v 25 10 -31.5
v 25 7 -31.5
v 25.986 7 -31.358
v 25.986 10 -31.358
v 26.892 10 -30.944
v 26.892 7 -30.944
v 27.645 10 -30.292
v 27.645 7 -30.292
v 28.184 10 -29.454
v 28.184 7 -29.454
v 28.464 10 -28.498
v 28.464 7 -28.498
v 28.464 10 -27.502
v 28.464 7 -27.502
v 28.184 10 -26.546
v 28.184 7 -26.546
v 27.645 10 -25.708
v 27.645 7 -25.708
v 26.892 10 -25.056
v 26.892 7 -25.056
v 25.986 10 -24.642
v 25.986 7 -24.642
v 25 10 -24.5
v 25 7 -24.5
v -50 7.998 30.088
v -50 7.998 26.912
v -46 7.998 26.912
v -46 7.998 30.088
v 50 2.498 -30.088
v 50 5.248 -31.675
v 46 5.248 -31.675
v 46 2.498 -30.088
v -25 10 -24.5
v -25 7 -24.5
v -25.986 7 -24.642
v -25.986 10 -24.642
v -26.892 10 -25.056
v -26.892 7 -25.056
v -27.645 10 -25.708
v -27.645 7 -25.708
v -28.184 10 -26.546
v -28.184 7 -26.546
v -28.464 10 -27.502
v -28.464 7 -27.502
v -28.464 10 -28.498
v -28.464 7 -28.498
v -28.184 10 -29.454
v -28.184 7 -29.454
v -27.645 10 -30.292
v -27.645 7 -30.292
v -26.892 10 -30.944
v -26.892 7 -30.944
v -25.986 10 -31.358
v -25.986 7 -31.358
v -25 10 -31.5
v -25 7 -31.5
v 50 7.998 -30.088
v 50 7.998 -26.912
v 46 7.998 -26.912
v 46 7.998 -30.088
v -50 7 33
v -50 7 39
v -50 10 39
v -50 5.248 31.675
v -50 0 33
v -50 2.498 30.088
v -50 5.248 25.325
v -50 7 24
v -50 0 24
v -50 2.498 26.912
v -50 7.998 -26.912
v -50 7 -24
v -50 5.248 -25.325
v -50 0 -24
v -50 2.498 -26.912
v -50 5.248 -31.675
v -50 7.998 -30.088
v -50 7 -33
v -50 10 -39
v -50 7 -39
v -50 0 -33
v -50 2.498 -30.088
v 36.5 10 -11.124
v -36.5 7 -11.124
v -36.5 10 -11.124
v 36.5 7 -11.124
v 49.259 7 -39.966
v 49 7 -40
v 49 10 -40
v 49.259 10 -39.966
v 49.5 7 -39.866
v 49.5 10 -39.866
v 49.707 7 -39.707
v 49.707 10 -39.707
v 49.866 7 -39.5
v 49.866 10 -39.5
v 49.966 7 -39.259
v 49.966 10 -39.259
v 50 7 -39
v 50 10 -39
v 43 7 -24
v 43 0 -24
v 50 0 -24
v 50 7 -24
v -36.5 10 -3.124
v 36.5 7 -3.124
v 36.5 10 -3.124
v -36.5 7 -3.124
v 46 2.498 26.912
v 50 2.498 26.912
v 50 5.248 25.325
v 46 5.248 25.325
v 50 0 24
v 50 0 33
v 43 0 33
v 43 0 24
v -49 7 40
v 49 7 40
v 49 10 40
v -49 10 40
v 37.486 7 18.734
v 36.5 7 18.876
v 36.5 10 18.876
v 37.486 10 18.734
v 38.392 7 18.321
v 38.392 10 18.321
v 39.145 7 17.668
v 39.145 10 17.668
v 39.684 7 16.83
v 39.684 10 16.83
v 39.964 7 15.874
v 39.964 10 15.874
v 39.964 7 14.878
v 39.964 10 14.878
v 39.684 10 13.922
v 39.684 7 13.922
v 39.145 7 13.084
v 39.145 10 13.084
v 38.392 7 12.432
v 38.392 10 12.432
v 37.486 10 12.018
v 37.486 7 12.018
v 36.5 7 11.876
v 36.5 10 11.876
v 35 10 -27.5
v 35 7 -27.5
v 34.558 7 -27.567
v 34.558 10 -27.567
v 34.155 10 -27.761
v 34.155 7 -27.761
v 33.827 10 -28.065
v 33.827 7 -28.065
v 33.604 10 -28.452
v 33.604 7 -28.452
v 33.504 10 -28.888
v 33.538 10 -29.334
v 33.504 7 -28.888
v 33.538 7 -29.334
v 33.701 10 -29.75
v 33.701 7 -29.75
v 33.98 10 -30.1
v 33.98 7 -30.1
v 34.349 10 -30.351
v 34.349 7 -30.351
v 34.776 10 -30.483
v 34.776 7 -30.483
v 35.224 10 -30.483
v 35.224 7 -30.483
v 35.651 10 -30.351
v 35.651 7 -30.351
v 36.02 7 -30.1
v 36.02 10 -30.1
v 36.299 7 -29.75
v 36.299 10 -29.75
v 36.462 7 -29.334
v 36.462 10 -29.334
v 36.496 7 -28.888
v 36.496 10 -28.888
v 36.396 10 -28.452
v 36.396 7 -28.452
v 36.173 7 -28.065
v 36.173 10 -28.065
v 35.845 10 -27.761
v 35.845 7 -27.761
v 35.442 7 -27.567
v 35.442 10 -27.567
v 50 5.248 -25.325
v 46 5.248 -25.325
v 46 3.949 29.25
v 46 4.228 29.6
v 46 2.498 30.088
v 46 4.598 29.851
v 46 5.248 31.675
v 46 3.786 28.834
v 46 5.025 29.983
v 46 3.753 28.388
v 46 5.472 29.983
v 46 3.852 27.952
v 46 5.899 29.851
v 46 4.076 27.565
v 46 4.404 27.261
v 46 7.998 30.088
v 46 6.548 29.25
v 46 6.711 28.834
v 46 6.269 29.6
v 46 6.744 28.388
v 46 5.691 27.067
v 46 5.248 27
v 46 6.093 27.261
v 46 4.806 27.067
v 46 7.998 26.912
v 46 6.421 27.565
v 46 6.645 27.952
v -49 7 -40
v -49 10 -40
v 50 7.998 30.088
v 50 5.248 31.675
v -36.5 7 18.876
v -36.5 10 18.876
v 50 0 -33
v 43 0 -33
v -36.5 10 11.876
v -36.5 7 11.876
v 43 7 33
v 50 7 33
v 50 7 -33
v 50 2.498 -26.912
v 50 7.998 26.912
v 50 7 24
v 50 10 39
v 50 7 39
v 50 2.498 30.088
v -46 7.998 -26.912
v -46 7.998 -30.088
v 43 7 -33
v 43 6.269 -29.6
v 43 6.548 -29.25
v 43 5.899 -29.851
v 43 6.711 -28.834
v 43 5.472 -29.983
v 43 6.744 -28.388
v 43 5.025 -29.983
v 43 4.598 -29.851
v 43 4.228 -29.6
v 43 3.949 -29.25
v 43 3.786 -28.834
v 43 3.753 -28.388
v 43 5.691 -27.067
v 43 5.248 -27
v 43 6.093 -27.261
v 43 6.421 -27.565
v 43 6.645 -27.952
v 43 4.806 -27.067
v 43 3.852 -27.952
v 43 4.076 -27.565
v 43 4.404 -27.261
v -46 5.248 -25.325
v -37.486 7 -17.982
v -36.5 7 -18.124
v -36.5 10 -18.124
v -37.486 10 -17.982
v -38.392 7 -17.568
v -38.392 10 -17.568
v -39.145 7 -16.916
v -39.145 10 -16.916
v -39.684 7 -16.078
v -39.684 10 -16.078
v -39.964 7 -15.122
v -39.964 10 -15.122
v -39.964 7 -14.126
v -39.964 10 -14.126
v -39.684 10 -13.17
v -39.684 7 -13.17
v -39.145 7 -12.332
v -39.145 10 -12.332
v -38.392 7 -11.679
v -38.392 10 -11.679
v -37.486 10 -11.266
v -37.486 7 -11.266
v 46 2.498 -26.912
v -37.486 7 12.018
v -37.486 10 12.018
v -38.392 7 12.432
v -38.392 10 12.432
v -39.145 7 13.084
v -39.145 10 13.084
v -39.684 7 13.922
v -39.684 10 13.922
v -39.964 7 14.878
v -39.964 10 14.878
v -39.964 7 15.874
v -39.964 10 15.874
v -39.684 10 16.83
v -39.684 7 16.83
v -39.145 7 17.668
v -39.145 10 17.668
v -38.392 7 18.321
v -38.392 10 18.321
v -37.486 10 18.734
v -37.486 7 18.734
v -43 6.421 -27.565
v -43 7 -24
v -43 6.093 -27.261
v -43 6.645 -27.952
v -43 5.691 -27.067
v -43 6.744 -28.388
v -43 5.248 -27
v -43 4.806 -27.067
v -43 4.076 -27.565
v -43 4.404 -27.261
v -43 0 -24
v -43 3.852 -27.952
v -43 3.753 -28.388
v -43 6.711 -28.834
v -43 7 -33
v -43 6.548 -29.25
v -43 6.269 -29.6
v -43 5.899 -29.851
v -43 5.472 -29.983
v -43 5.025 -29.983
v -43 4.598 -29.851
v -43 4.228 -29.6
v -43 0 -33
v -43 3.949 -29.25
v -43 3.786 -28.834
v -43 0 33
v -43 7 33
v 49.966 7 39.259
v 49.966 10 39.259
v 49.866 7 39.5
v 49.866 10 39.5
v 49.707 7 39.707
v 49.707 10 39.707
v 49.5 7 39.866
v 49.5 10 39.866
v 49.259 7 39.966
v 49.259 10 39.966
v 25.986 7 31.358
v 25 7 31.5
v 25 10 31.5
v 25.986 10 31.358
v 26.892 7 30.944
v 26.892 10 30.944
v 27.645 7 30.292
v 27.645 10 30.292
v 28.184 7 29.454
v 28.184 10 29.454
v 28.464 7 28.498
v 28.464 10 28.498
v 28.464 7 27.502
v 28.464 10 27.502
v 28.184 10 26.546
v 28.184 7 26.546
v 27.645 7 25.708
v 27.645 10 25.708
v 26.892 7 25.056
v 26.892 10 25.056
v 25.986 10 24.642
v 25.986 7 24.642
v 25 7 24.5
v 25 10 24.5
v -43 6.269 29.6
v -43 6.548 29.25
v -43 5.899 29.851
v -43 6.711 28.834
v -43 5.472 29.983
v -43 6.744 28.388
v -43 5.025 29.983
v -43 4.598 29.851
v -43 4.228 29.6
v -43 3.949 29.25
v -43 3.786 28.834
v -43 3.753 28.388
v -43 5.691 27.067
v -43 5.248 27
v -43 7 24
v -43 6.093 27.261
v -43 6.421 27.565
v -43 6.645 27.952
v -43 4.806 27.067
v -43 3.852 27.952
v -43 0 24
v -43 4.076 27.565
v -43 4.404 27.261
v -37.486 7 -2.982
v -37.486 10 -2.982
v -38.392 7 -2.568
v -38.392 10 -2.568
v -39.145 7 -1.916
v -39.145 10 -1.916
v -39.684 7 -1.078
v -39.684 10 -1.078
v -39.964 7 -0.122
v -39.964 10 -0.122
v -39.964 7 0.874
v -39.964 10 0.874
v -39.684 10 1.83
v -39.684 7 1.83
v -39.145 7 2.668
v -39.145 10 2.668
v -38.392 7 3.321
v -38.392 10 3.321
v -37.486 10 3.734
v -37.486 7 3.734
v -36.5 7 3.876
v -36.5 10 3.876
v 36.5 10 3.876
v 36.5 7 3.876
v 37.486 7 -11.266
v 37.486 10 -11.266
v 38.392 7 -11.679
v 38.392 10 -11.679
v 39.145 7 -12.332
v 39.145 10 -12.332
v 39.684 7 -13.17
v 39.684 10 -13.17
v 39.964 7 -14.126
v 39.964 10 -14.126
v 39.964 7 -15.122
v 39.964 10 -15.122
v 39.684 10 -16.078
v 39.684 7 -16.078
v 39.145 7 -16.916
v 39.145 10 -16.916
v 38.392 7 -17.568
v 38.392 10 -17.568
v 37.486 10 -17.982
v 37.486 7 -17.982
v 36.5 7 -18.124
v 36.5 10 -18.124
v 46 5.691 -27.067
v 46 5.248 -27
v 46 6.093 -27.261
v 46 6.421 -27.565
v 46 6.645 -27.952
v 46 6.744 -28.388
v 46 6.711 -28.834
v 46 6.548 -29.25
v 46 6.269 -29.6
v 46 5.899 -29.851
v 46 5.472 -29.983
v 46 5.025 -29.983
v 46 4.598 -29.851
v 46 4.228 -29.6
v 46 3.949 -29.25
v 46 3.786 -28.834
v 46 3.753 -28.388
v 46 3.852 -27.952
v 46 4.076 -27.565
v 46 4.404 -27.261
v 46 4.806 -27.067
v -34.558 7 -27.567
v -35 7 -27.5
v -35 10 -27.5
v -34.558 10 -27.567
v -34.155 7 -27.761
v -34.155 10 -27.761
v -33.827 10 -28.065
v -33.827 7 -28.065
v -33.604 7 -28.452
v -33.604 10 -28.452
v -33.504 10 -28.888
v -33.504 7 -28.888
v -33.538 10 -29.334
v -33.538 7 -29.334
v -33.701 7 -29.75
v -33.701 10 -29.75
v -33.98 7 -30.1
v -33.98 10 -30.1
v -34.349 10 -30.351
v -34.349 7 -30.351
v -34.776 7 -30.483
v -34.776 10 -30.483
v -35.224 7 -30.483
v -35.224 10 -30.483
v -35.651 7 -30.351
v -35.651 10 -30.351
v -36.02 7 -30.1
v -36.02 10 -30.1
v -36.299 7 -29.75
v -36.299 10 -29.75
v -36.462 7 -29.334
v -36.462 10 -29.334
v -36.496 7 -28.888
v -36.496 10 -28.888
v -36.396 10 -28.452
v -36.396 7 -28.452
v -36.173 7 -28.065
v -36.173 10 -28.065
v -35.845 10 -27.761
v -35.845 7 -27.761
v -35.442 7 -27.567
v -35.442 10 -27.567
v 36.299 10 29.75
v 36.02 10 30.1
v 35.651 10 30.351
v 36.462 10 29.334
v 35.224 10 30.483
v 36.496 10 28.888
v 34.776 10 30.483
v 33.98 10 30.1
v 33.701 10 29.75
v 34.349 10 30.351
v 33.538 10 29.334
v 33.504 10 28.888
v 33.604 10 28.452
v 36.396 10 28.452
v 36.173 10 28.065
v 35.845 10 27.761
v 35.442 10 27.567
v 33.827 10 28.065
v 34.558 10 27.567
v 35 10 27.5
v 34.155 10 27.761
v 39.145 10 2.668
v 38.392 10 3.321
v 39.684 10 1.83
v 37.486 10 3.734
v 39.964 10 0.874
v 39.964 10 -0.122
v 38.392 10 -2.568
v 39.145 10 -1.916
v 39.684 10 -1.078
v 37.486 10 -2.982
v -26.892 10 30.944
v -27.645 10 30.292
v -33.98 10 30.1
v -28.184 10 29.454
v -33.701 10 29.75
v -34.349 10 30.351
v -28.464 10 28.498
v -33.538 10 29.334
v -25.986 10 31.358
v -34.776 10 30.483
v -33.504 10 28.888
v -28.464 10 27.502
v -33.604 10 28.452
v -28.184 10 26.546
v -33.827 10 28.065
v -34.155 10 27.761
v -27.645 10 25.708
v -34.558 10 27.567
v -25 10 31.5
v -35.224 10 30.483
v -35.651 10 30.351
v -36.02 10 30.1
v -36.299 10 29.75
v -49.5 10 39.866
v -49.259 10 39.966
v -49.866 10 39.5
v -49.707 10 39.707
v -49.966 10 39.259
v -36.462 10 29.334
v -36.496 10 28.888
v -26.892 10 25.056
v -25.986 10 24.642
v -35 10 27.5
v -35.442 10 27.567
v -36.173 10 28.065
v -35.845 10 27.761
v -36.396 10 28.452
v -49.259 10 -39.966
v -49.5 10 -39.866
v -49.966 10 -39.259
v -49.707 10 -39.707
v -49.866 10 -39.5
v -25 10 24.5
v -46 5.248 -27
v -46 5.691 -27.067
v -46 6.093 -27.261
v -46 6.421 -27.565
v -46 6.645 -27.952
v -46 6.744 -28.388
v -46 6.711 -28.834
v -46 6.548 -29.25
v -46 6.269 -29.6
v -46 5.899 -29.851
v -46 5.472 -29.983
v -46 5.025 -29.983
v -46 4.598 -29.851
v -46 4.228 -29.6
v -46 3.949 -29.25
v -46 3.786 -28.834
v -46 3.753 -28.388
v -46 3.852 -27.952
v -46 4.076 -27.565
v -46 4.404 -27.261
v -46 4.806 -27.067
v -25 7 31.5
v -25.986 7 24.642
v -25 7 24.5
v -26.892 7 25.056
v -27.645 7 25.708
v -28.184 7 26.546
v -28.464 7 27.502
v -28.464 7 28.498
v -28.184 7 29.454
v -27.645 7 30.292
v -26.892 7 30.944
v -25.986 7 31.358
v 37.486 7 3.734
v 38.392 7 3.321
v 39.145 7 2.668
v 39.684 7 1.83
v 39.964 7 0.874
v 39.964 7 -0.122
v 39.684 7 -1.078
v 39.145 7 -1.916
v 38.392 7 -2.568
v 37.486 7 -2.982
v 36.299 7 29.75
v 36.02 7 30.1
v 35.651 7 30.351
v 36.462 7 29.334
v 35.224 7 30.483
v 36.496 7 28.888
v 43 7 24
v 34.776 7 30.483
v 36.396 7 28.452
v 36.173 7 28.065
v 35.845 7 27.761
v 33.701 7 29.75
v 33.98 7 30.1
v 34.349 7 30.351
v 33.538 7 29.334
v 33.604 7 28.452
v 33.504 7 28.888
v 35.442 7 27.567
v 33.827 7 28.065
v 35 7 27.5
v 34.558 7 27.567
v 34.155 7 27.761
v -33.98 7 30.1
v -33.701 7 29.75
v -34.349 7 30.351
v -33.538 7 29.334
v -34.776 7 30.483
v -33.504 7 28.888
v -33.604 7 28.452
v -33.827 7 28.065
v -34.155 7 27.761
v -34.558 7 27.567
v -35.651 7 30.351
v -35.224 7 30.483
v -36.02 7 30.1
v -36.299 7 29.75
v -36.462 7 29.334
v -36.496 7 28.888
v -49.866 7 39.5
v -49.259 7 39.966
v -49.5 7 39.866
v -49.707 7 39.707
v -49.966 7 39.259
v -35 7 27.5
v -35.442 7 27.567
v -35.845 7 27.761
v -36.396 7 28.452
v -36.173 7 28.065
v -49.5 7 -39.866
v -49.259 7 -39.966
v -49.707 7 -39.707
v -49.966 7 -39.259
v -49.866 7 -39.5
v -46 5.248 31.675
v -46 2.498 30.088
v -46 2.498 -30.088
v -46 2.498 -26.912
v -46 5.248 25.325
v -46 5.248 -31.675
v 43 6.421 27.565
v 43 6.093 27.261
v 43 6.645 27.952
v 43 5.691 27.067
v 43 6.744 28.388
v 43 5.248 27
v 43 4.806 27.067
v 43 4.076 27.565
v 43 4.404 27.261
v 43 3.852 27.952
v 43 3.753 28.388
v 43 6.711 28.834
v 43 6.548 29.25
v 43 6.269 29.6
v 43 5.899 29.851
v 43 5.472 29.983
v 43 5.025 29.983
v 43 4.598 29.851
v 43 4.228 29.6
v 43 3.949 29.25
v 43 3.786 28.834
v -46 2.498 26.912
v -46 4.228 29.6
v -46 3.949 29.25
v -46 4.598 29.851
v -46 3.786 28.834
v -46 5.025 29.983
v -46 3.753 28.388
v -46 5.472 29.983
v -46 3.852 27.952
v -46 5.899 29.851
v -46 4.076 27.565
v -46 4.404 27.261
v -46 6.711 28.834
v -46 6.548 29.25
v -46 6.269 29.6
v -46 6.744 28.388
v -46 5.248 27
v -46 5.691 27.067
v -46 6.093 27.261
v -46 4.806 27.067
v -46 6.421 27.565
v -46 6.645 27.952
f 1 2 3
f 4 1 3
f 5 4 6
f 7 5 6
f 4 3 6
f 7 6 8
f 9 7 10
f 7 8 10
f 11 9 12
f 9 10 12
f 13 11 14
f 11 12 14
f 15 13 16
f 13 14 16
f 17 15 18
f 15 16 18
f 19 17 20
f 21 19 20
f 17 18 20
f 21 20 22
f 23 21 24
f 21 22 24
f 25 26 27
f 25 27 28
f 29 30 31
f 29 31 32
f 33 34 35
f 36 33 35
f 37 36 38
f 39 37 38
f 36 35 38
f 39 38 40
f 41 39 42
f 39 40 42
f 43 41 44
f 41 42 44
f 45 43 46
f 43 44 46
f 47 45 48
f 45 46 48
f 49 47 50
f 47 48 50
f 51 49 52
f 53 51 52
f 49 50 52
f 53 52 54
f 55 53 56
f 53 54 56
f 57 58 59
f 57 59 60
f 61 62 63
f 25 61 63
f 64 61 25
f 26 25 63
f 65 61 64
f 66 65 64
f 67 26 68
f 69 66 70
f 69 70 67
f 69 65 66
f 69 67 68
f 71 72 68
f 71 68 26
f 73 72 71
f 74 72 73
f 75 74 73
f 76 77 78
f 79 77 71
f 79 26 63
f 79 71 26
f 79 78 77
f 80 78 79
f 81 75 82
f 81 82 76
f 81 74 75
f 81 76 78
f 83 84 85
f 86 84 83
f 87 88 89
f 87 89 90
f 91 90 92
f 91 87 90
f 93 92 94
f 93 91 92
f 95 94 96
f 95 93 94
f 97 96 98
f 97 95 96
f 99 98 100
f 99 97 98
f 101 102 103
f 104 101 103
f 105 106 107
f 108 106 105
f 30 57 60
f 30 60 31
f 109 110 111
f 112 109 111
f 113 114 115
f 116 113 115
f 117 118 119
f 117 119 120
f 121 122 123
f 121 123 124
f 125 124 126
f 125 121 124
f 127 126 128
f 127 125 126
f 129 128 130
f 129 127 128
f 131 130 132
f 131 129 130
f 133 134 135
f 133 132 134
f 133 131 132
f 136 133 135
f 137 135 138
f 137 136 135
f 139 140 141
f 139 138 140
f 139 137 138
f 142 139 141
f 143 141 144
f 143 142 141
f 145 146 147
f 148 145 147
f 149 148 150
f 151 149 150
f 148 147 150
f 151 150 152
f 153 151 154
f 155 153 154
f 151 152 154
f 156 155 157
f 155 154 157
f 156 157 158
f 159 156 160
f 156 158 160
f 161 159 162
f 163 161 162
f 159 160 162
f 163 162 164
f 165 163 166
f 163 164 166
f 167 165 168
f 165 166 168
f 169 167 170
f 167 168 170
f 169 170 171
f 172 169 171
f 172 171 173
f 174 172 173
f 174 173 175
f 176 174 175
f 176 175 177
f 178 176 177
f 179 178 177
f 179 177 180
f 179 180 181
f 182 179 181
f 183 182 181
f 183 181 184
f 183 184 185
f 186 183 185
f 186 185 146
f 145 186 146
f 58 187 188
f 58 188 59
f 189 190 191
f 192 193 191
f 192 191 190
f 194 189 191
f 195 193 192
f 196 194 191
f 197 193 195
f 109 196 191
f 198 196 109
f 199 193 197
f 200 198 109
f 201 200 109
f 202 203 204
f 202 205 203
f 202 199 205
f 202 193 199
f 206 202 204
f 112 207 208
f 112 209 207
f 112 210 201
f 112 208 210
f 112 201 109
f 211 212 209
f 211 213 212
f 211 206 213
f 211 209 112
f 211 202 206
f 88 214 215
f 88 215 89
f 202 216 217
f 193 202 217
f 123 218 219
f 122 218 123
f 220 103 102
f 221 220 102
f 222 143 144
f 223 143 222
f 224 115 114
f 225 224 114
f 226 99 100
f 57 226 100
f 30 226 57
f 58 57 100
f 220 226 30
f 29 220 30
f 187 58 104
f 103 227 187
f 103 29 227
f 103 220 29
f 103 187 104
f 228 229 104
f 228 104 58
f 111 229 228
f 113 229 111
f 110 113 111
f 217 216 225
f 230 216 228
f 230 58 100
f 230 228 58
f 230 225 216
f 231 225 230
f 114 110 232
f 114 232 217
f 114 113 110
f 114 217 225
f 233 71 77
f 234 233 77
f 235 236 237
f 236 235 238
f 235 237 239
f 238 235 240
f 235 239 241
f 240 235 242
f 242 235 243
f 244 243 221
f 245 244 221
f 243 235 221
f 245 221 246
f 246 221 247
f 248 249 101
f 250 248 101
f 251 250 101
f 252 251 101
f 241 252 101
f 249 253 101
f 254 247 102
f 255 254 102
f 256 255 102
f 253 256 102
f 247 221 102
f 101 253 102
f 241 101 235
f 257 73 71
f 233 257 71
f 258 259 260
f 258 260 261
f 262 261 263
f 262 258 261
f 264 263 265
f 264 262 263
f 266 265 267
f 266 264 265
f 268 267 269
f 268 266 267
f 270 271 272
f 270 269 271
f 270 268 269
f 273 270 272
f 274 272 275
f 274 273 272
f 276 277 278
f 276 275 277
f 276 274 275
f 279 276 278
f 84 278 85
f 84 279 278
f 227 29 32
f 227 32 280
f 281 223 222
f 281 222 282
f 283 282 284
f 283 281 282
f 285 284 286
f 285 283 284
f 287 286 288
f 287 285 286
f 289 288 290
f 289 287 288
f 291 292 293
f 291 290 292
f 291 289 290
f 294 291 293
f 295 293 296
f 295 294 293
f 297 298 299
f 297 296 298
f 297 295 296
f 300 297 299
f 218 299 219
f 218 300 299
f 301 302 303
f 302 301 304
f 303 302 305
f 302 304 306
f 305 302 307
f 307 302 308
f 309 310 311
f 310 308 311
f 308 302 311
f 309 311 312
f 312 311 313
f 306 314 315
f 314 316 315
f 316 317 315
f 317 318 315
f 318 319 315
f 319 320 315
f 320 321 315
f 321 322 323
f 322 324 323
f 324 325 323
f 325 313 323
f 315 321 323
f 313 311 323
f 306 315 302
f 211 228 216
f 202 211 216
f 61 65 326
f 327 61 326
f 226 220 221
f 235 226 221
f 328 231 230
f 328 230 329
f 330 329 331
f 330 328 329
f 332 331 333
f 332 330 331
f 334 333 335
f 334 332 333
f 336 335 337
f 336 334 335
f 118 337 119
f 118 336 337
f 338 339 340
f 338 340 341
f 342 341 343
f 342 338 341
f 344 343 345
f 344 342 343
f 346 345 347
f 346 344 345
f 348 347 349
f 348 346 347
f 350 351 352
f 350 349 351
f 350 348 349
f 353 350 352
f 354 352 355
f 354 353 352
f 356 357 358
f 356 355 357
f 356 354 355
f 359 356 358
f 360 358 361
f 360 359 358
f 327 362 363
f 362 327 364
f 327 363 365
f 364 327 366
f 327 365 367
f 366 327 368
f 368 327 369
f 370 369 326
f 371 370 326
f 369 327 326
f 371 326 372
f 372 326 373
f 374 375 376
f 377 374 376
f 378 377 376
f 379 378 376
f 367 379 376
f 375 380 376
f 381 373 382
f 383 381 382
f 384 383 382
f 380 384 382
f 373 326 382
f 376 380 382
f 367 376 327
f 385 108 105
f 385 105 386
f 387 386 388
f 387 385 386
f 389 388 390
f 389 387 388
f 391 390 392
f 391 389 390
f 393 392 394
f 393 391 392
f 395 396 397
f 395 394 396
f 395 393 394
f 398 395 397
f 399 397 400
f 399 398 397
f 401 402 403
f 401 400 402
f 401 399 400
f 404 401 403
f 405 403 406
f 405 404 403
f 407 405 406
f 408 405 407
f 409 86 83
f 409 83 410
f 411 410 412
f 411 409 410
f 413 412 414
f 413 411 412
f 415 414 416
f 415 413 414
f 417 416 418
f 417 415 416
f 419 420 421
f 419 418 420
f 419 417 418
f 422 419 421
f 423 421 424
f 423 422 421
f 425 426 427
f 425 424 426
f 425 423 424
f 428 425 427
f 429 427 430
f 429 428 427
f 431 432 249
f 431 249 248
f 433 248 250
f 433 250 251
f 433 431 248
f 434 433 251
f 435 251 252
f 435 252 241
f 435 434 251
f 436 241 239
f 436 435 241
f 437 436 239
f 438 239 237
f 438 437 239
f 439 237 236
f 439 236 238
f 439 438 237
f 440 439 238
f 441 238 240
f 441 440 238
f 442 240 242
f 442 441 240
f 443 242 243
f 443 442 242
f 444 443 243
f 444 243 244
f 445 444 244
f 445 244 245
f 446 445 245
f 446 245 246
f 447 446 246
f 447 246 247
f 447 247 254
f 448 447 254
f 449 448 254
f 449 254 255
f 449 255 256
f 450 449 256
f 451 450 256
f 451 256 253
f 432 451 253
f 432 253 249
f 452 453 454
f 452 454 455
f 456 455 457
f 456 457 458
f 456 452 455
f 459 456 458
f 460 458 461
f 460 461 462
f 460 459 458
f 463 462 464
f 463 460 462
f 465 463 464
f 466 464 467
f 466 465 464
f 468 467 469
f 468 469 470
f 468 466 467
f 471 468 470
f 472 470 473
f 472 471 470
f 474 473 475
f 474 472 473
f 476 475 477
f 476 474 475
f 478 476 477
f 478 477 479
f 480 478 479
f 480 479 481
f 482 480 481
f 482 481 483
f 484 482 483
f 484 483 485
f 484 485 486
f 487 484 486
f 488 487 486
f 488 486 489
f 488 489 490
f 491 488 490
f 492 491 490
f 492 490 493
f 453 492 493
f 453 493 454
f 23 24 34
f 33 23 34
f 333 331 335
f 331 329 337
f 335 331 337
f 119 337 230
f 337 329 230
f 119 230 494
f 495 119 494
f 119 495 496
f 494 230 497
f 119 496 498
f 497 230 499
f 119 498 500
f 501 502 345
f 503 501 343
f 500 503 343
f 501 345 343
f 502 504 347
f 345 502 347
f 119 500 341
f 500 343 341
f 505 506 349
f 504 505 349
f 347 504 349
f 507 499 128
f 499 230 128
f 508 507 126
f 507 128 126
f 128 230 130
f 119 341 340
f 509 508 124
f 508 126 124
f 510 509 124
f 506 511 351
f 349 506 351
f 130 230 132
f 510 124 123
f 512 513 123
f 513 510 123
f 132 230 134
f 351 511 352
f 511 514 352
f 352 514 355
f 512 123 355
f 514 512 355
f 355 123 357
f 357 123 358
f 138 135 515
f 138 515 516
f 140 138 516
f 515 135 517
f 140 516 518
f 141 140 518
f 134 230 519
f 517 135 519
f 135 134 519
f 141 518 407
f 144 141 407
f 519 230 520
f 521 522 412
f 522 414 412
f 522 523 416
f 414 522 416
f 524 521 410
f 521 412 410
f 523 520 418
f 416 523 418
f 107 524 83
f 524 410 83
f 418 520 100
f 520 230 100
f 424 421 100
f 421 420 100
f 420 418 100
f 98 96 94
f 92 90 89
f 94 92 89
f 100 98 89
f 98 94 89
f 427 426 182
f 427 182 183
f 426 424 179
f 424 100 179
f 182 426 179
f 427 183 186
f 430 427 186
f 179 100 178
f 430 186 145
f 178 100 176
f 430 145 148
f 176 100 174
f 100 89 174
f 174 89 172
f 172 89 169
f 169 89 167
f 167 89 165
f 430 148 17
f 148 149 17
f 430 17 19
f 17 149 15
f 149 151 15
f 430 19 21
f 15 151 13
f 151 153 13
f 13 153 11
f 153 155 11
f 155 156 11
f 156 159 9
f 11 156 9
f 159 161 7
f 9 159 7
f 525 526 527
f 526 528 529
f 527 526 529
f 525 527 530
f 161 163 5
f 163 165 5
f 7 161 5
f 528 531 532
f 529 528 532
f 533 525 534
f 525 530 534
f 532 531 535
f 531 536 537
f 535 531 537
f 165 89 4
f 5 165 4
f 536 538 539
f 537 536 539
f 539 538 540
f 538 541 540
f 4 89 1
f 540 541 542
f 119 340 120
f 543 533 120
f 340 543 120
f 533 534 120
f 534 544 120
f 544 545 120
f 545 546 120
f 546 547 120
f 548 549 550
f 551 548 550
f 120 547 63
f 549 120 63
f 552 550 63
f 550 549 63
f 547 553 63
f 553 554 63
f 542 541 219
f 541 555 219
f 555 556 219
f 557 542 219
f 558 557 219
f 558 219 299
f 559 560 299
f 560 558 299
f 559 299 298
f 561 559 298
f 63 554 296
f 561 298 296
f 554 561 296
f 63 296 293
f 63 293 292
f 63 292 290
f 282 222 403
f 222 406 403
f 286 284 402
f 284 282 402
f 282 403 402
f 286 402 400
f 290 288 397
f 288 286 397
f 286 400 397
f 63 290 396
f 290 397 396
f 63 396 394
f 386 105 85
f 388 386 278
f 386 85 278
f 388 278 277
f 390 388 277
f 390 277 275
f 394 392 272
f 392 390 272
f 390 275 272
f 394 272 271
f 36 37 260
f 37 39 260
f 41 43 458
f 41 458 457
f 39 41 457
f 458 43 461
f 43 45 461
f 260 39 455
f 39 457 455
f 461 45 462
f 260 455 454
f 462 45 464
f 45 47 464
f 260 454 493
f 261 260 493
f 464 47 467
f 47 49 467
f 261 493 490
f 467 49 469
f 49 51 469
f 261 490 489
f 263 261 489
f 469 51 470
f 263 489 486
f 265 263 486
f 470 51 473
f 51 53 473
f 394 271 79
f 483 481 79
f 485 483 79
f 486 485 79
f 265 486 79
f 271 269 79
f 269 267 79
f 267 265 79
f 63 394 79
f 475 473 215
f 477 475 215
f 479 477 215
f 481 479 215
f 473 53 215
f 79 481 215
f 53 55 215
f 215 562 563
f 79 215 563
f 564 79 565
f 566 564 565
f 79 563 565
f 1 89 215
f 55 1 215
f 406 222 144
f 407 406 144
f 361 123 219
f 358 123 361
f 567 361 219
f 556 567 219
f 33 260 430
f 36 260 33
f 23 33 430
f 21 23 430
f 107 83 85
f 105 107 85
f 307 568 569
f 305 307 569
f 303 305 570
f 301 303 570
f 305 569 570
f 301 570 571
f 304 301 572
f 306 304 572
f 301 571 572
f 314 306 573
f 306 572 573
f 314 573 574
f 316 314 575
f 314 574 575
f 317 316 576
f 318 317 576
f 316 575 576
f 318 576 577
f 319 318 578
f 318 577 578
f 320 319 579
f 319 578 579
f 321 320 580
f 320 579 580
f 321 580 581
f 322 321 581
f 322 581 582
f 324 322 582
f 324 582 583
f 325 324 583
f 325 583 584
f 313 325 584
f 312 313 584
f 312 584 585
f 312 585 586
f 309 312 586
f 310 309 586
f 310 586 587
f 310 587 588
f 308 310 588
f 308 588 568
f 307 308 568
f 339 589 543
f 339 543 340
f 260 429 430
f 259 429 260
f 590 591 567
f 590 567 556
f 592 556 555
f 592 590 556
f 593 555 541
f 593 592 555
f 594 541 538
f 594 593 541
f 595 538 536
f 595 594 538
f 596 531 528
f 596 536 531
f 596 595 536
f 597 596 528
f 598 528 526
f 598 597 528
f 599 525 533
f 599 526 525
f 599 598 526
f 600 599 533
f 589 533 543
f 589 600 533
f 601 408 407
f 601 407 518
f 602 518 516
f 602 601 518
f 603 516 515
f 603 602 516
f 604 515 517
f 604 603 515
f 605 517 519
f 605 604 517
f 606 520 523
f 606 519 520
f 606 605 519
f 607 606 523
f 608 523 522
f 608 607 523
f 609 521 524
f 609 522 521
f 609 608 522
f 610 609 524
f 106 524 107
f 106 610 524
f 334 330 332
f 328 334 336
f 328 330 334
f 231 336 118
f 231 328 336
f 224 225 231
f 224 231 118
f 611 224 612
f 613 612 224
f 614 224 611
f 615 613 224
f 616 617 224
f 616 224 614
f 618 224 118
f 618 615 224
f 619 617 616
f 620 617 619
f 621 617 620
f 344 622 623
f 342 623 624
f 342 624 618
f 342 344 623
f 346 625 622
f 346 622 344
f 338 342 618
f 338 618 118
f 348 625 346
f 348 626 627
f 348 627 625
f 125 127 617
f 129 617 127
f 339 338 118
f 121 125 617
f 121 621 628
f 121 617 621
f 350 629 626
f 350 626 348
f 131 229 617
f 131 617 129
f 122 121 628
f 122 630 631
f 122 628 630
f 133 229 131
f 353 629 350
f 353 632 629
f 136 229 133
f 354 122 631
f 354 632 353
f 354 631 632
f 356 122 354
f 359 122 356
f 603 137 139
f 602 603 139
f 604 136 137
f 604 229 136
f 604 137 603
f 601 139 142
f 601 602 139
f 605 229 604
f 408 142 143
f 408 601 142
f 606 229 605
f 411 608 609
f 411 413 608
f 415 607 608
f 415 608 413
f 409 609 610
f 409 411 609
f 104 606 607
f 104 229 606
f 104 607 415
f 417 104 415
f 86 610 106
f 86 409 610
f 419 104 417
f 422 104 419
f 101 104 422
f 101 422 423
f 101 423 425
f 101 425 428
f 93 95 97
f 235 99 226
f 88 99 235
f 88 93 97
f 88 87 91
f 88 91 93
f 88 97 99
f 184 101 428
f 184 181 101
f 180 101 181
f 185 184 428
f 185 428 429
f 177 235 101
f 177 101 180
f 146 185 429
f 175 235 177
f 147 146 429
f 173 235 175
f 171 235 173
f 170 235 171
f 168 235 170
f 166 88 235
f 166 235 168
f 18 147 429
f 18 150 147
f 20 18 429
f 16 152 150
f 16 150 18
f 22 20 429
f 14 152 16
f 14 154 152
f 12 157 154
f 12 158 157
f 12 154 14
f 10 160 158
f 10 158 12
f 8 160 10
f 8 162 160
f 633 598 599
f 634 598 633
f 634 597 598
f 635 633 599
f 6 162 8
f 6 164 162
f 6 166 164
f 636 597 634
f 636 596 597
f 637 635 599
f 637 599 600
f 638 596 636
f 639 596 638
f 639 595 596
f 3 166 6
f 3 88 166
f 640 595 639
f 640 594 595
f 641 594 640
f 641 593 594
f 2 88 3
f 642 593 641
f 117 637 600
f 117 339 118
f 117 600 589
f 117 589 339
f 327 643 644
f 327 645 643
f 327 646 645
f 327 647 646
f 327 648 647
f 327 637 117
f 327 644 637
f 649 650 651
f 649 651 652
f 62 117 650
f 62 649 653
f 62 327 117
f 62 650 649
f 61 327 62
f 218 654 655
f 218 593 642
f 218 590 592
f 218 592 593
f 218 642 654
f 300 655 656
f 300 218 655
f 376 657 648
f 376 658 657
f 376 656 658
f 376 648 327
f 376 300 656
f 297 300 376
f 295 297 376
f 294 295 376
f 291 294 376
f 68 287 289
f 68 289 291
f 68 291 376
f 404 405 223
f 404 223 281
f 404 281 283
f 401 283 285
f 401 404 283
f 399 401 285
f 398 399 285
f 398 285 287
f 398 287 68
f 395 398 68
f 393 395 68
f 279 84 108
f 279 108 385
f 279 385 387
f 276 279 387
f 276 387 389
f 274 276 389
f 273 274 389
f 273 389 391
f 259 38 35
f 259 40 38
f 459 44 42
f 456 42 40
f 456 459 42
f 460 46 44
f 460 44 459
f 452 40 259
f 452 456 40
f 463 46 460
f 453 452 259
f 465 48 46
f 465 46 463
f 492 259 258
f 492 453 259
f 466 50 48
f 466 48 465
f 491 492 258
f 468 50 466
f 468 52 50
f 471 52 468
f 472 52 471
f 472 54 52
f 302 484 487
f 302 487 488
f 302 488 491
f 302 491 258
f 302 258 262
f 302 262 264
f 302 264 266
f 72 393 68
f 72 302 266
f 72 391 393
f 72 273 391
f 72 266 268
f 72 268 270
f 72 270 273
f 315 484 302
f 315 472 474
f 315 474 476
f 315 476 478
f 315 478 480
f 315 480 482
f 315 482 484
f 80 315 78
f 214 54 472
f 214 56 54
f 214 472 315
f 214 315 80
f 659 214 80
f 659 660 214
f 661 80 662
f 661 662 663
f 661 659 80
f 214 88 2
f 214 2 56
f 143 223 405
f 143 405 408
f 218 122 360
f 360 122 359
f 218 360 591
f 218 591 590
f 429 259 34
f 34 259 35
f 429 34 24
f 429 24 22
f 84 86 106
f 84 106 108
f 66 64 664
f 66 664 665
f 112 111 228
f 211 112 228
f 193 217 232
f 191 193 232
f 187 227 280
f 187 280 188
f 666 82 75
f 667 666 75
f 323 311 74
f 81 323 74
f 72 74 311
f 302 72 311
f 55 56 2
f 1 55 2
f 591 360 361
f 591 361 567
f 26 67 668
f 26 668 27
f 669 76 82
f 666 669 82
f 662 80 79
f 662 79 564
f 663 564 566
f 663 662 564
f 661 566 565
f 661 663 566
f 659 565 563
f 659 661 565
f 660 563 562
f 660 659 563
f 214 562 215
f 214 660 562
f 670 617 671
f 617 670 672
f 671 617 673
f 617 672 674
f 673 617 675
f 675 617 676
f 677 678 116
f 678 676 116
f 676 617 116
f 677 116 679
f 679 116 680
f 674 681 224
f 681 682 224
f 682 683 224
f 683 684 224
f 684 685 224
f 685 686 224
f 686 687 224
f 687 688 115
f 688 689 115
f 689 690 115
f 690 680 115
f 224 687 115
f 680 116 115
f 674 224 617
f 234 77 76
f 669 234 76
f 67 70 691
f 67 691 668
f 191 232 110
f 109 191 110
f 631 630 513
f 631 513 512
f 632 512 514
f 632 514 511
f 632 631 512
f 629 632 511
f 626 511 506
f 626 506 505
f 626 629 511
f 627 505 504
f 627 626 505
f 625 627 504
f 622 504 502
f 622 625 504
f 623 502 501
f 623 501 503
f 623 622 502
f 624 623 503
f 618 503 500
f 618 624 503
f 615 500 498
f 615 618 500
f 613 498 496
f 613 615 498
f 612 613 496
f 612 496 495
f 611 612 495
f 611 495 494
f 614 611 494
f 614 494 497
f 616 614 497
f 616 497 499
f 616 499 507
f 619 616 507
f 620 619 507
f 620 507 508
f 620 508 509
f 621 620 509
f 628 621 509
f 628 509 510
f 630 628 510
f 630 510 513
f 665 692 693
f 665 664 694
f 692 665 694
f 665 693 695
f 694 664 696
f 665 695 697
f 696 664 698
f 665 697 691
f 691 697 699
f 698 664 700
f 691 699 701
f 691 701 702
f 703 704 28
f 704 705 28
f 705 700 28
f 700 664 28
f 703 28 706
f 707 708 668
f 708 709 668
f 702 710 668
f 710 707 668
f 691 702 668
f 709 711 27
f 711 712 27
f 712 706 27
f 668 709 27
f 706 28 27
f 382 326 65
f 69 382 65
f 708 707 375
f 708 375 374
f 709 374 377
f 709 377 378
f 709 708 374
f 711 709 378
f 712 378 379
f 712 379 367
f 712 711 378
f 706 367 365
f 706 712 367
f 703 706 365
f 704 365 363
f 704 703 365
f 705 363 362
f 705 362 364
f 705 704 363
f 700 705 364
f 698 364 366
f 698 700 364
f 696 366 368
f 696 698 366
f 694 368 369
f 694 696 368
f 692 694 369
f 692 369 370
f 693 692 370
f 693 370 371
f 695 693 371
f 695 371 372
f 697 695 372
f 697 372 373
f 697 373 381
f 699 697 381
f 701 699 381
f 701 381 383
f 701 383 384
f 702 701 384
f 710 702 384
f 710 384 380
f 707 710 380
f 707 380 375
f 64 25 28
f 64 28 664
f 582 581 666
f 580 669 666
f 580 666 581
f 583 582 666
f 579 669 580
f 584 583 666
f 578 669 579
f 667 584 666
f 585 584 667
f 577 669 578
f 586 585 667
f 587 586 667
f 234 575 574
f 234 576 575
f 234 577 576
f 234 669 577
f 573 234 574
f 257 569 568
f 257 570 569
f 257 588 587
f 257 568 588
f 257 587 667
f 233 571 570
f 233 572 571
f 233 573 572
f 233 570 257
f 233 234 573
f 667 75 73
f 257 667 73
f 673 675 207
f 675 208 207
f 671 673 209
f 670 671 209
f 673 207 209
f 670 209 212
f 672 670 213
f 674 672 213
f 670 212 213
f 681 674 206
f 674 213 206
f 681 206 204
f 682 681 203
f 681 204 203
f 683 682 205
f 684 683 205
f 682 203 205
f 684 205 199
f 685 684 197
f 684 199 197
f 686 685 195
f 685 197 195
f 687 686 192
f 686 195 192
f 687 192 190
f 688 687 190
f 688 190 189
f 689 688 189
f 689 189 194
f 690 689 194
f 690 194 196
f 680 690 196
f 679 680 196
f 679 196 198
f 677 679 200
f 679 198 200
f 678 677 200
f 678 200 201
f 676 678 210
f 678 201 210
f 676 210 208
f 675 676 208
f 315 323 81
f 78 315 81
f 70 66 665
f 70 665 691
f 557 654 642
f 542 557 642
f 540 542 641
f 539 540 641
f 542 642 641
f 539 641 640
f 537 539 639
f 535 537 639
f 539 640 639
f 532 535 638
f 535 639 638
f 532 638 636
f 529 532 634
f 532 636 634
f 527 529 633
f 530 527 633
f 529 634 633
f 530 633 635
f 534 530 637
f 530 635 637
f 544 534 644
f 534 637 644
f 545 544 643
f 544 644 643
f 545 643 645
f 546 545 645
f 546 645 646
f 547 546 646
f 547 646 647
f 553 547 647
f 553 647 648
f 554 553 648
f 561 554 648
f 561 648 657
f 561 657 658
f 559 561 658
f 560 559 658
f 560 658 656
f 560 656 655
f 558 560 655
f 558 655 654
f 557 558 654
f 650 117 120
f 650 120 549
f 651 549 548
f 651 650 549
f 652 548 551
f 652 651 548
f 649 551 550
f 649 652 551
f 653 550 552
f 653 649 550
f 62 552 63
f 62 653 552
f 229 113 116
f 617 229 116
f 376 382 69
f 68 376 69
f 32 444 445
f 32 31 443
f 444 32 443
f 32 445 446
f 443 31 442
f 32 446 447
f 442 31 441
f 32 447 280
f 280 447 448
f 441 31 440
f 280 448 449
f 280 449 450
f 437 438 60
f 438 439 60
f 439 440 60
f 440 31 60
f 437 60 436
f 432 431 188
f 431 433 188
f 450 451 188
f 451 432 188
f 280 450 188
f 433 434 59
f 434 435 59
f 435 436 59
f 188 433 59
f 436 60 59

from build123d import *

# Parameters (mm, degrees)
EXTRUDE_1_DEPTH                            = 10
CUT_EXTRUDE_1_DEPTH                        = 7
CUT_EXTRUDE_3_DEPTH                        = 4
CUT_EXTRUDE_4_DEPTH                        = 65.412731661
CUT_EXTRUDE_6_REACH                        = 106.48
SKETCH_8_R                                 = 1.5
CUT_EXTRUDE_6_DIRECTION_2_DEPTH            = 105.479663093
MIRROR_2_AT_THE_SECOND_PLANE_COPY_1_REACH  = 106.48
MIRROR_2_AT_THE_SECOND_PLANE_COPY_1_SKET_R = 1.5
MIRROR_2_AT_THE_SECOND_PLANE_COPY_2_SKET_R = 1.5
MIRROR_2_AT_THE_SECOND_PLANE_COPY_2_DEPTH  = 105.479663093
MIRROR_2_AT_THE_SECOND_PLANE_COPY_3_SKET_R = 1.5
MIRROR_2_AT_THE_SECOND_PLANE_COPY_3_DEPTH  = 105.479663093
CUT_EXTRUDE_7_REACH                        = 66.413
SKETCH_9_R                                 = 1.5
MIRROR_3_AT_THE_SECOND_PLANE_COPY_1_REACH  = 66.413
MIRROR_3_AT_THE_SECOND_PLANE_COPY_1_SKET_R = 1.5


with BuildPart() as part:
    # 草图1 → 凸台-拉伸1 (new body)
    with BuildSketch(Plane(origin=(0, 0, 0), x_dir=(1, 0, 0), z_dir=(0, 1, 0))):
        with BuildLine():
            Line((-49, 40), (49, 40))
            ThreePointArc((49, 40), (49.707106781, 39.707106781), (50, 39))
            Line((50, 39), (50, -39))
            ThreePointArc((50, -39), (49.707106781, -39.707106781), (49, -40))
            Line((49, -40), (-49, -40))
            ThreePointArc((-49, -40), (-49.707106781, -39.707106781), (-50, -39))
            Line((-50, -39), (-50, 39))
            ThreePointArc((-50, 39), (-49.707106781, 39.707106781), (-49, 40))
        make_face()
    extrude(amount=EXTRUDE_1_DEPTH)

    # 草图2 → 切除-拉伸1 (cut)
    with BuildSketch(Plane(origin=(0, 0, 0), x_dir=(-1, 0, 0), z_dir=(0, -1, 0))):
        Polygon((-50, 33), (-43, 33), (-43, 24), (-50, 24), (-50, -24), (-43, -24), (-43, -33), (-50, -33), (-50, -40), (50, -40), (50, -33), (43, -33), (43, -24), (50, -24), (50, 24), (43, 24), (43, 33), (50, 33), (50, 40), (-50, 40), align=None)
    extrude(amount=-CUT_EXTRUDE_1_DEPTH, mode=Mode.SUBTRACT)

    # 草图5 → 切除-拉伸3 (cut)
    with BuildSketch(Plane.ZY.offset(50)):
        Polygon((30.08771324, 7.998490707), (31.675426481, 5.248490707), (30.08771324, 2.498490707), (26.91228676, 2.498490707), (25.324573519, 5.248490707), (26.91228676, 7.998490707), align=None)
        Polygon((-25.324573519, 5.248490707), (-26.91228676, 7.998490707), (-30.08771324, 7.998490707), (-31.675426481, 5.248490707), (-30.08771324, 2.498490707), (-26.91228676, 2.498490707), align=None)
    cut_extrude_3 = extrude(amount=-CUT_EXTRUDE_3_DEPTH, mode=Mode.SUBTRACT)

    # 镜向1: 切除-拉伸3 across plane
    add(cut_extrude_3.mirror(Plane(origin=(0, 0, 0), x_dir=(0, 0, 1), z_dir=(1, 0, 0))), mode=Mode.SUBTRACT)

    # 草图6 → 切除-拉伸4 (cut, through all)
    with BuildSketch(Plane(origin=(0, 7, 0), x_dir=(-1, 0, 0), z_dir=(0, -1, 0))):
        with BuildLine():
            Line((25, -31.5), (-25, -31.5))
            ThreePointArc((-25, -31.5), (-28.5, -28), (-25, -24.5))
            Line((-25, -24.5), (25, -24.5))
            ThreePointArc((25, -24.5), (28.5, -28), (25, -31.5))
        make_face()
        with BuildLine():
            Line((25, 31.5), (-25, 31.5))
            ThreePointArc((-25, 31.5), (-28.5, 28), (-25, 24.5))
            Line((-25, 24.5), (25, 24.5))
            ThreePointArc((25, 24.5), (28.5, 28), (25, 31.5))
        make_face()
        with BuildLine():
            Line((-36.5, -11.876137074), (36.5, -11.876137074))
            ThreePointArc((36.5, -11.876137074), (40, -15.376137074), (36.5, -18.876137074))
            Line((36.5, -18.876137074), (-36.5, -18.876137074))
            ThreePointArc((-36.5, -18.876137074), (-40, -15.376137074), (-36.5, -11.876137074))
        make_face()
        with BuildLine():
            Line((-36.5, 3.123862926), (36.5, 3.123862926))
            ThreePointArc((36.5, 3.123862926), (40, -0.376137074), (36.5, -3.876137074))
            Line((36.5, -3.876137074), (-36.5, -3.876137074))
            ThreePointArc((-36.5, -3.876137074), (-40, -0.376137074), (-36.5, 3.123862926))
        make_face()
        with BuildLine():
            Line((-36.5, 18.123862926), (36.5, 18.123862926))
            ThreePointArc((36.5, 18.123862926), (40, 14.623862926), (36.5, 11.123862926))
            Line((36.5, 11.123862926), (-36.5, 11.123862926))
            ThreePointArc((-36.5, 11.123862926), (-40, 14.623862926), (-36.5, 18.123862926))
        make_face()
    extrude(amount=-CUT_EXTRUDE_4_DEPTH, mode=Mode.SUBTRACT)

    # 草图8 → 切除-拉伸6 (cut, up to next)
    with BuildSketch(Plane.ZY.offset(46), mode=Mode.PRIVATE) as cut_extrude_6_sk1:
        with Locations((-28.5, 5.248490707)):
            Circle(SKETCH_8_R)
    cut_extrude_6_tool1 = extrude(cut_extrude_6_sk1.sketch, amount=-CUT_EXTRUDE_6_REACH, mode=Mode.PRIVATE) & part.part
    cut_extrude_6 = cut_extrude_6_tool1.solids().sort_by_distance((-46, 5.248491, -28.5))[0]
    add(cut_extrude_6, mode=Mode.SUBTRACT)

    # 草图8 → 切除-拉伸6 direction 2 (cut)
    with BuildSketch(Plane.ZY.offset(46)):
        with Locations((-28.5, 5.248490707)):
            Circle(SKETCH_8_R)
    cut_extrude_6_direction_2 = extrude(amount=CUT_EXTRUDE_6_DIRECTION_2_DEPTH, mode=Mode.SUBTRACT)

    # 镜向2: 切除-拉伸6, 切除-拉伸6 direction 2 across plane
    add(cut_extrude_6.mirror(Plane(origin=(0, 0, 0), x_dir=(0, 0, 1), z_dir=(1, 0, 0))), mode=Mode.SUBTRACT)
    add(cut_extrude_6_direction_2.mirror(Plane(origin=(0, 0, 0), x_dir=(0, 0, 1), z_dir=(1, 0, 0))), mode=Mode.SUBTRACT)

    # 镜向2 at the second plane: 切除-拉伸6, 切除-拉伸6 direction 2 across plane
    add(cut_extrude_6.mirror(Plane.XY), mode=Mode.SUBTRACT)
    add(cut_extrude_6_direction_2.mirror(Plane.XY), mode=Mode.SUBTRACT)

    # 镜向2 at the second plane copy 1 sket → 镜向2 at the second plane copy 1 (cut, up to next)
    with BuildSketch(Plane(origin=(46, 0, 0), x_dir=(0, 0, -1), z_dir=(1, 0, 0)), mode=Mode.PRIVATE) as mirror_2_at_the_second_plane_copy_1_sk1:
        with Locations((-28.5, 5.248490707)):
            Circle(MIRROR_2_AT_THE_SECOND_PLANE_COPY_1_SKET_R)
    mirror_2_at_the_second_plane_copy_1_tool1 = extrude(mirror_2_at_the_second_plane_copy_1_sk1.sketch, amount=-MIRROR_2_AT_THE_SECOND_PLANE_COPY_1_REACH, mode=Mode.PRIVATE) & part.part
    add(mirror_2_at_the_second_plane_copy_1_tool1.solids().sort_by_distance((46, 5.248491, 28.5))[0], mode=Mode.SUBTRACT)

    # 镜向2 at the second plane copy 2 sket → 镜向2 at the second plane copy 2 (cut)
    with BuildSketch(Plane(origin=(46, 0, 0), x_dir=(0, 0, -1), z_dir=(1, 0, 0))):
        with Locations((-28.5, 5.248490707)):
            Circle(MIRROR_2_AT_THE_SECOND_PLANE_COPY_2_SKET_R)
    extrude(amount=MIRROR_2_AT_THE_SECOND_PLANE_COPY_2_DEPTH, mode=Mode.SUBTRACT)

    # 镜向2 at the second plane copy 3 sket → 镜向2 at the second plane copy 3 (cut)
    with BuildSketch(Plane(origin=(-46, 0, 0), x_dir=(0, 0, -1), z_dir=(-1, 0, 0))):
        with Locations((-28.5, -5.248490707)):
            Circle(MIRROR_2_AT_THE_SECOND_PLANE_COPY_3_SKET_R)
    extrude(amount=MIRROR_2_AT_THE_SECOND_PLANE_COPY_3_DEPTH, mode=Mode.SUBTRACT)

    # 草图9 → 切除-拉伸7 (cut, up to next)
    with BuildSketch(Plane(origin=(0, 7, 0), x_dir=(-1, 0, 0), z_dir=(0, -1, 0)), mode=Mode.PRIVATE) as cut_extrude_7_sk1:
        with Locations(Location((35, -29, 0), (0, 0, 90))):
            Circle(SKETCH_9_R)
    cut_extrude_7_tool1 = extrude(cut_extrude_7_sk1.sketch, amount=-CUT_EXTRUDE_7_REACH, mode=Mode.PRIVATE) & part.part
    cut_extrude_7 = cut_extrude_7_tool1.solids().sort_by_distance((-35, 7, 29))[0]
    add(cut_extrude_7, mode=Mode.SUBTRACT)

    # 镜向3: 切除-拉伸7 across plane
    add(cut_extrude_7.mirror(Plane.XY), mode=Mode.SUBTRACT)

    # 镜向3 at the second plane: 切除-拉伸7 across plane
    add(cut_extrude_7.mirror(Plane(origin=(0, 0, 0), x_dir=(0, 0, 1), z_dir=(1, 0, 0))), mode=Mode.SUBTRACT)

    # 镜向3 at the second plane copy 1 sket → 镜向3 at the second plane copy 1 (cut, up to next)
    with BuildSketch(Plane.XZ.offset(-7), mode=Mode.PRIVATE) as mirror_3_at_the_second_plane_copy_1_sk1:
        with Locations(Location((35, -29, 0), (0, 0, 90))):
            Circle(MIRROR_3_AT_THE_SECOND_PLANE_COPY_1_SKET_R)
    mirror_3_at_the_second_plane_copy_1_tool1 = extrude(mirror_3_at_the_second_plane_copy_1_sk1.sketch, amount=-MIRROR_3_AT_THE_SECOND_PLANE_COPY_1_REACH, mode=Mode.PRIVATE) & part.part
    add(mirror_3_at_the_second_plane_copy_1_tool1.solids().sort_by_distance((35, 7, -29))[0], mode=Mode.SUBTRACT)


solid = part.part
